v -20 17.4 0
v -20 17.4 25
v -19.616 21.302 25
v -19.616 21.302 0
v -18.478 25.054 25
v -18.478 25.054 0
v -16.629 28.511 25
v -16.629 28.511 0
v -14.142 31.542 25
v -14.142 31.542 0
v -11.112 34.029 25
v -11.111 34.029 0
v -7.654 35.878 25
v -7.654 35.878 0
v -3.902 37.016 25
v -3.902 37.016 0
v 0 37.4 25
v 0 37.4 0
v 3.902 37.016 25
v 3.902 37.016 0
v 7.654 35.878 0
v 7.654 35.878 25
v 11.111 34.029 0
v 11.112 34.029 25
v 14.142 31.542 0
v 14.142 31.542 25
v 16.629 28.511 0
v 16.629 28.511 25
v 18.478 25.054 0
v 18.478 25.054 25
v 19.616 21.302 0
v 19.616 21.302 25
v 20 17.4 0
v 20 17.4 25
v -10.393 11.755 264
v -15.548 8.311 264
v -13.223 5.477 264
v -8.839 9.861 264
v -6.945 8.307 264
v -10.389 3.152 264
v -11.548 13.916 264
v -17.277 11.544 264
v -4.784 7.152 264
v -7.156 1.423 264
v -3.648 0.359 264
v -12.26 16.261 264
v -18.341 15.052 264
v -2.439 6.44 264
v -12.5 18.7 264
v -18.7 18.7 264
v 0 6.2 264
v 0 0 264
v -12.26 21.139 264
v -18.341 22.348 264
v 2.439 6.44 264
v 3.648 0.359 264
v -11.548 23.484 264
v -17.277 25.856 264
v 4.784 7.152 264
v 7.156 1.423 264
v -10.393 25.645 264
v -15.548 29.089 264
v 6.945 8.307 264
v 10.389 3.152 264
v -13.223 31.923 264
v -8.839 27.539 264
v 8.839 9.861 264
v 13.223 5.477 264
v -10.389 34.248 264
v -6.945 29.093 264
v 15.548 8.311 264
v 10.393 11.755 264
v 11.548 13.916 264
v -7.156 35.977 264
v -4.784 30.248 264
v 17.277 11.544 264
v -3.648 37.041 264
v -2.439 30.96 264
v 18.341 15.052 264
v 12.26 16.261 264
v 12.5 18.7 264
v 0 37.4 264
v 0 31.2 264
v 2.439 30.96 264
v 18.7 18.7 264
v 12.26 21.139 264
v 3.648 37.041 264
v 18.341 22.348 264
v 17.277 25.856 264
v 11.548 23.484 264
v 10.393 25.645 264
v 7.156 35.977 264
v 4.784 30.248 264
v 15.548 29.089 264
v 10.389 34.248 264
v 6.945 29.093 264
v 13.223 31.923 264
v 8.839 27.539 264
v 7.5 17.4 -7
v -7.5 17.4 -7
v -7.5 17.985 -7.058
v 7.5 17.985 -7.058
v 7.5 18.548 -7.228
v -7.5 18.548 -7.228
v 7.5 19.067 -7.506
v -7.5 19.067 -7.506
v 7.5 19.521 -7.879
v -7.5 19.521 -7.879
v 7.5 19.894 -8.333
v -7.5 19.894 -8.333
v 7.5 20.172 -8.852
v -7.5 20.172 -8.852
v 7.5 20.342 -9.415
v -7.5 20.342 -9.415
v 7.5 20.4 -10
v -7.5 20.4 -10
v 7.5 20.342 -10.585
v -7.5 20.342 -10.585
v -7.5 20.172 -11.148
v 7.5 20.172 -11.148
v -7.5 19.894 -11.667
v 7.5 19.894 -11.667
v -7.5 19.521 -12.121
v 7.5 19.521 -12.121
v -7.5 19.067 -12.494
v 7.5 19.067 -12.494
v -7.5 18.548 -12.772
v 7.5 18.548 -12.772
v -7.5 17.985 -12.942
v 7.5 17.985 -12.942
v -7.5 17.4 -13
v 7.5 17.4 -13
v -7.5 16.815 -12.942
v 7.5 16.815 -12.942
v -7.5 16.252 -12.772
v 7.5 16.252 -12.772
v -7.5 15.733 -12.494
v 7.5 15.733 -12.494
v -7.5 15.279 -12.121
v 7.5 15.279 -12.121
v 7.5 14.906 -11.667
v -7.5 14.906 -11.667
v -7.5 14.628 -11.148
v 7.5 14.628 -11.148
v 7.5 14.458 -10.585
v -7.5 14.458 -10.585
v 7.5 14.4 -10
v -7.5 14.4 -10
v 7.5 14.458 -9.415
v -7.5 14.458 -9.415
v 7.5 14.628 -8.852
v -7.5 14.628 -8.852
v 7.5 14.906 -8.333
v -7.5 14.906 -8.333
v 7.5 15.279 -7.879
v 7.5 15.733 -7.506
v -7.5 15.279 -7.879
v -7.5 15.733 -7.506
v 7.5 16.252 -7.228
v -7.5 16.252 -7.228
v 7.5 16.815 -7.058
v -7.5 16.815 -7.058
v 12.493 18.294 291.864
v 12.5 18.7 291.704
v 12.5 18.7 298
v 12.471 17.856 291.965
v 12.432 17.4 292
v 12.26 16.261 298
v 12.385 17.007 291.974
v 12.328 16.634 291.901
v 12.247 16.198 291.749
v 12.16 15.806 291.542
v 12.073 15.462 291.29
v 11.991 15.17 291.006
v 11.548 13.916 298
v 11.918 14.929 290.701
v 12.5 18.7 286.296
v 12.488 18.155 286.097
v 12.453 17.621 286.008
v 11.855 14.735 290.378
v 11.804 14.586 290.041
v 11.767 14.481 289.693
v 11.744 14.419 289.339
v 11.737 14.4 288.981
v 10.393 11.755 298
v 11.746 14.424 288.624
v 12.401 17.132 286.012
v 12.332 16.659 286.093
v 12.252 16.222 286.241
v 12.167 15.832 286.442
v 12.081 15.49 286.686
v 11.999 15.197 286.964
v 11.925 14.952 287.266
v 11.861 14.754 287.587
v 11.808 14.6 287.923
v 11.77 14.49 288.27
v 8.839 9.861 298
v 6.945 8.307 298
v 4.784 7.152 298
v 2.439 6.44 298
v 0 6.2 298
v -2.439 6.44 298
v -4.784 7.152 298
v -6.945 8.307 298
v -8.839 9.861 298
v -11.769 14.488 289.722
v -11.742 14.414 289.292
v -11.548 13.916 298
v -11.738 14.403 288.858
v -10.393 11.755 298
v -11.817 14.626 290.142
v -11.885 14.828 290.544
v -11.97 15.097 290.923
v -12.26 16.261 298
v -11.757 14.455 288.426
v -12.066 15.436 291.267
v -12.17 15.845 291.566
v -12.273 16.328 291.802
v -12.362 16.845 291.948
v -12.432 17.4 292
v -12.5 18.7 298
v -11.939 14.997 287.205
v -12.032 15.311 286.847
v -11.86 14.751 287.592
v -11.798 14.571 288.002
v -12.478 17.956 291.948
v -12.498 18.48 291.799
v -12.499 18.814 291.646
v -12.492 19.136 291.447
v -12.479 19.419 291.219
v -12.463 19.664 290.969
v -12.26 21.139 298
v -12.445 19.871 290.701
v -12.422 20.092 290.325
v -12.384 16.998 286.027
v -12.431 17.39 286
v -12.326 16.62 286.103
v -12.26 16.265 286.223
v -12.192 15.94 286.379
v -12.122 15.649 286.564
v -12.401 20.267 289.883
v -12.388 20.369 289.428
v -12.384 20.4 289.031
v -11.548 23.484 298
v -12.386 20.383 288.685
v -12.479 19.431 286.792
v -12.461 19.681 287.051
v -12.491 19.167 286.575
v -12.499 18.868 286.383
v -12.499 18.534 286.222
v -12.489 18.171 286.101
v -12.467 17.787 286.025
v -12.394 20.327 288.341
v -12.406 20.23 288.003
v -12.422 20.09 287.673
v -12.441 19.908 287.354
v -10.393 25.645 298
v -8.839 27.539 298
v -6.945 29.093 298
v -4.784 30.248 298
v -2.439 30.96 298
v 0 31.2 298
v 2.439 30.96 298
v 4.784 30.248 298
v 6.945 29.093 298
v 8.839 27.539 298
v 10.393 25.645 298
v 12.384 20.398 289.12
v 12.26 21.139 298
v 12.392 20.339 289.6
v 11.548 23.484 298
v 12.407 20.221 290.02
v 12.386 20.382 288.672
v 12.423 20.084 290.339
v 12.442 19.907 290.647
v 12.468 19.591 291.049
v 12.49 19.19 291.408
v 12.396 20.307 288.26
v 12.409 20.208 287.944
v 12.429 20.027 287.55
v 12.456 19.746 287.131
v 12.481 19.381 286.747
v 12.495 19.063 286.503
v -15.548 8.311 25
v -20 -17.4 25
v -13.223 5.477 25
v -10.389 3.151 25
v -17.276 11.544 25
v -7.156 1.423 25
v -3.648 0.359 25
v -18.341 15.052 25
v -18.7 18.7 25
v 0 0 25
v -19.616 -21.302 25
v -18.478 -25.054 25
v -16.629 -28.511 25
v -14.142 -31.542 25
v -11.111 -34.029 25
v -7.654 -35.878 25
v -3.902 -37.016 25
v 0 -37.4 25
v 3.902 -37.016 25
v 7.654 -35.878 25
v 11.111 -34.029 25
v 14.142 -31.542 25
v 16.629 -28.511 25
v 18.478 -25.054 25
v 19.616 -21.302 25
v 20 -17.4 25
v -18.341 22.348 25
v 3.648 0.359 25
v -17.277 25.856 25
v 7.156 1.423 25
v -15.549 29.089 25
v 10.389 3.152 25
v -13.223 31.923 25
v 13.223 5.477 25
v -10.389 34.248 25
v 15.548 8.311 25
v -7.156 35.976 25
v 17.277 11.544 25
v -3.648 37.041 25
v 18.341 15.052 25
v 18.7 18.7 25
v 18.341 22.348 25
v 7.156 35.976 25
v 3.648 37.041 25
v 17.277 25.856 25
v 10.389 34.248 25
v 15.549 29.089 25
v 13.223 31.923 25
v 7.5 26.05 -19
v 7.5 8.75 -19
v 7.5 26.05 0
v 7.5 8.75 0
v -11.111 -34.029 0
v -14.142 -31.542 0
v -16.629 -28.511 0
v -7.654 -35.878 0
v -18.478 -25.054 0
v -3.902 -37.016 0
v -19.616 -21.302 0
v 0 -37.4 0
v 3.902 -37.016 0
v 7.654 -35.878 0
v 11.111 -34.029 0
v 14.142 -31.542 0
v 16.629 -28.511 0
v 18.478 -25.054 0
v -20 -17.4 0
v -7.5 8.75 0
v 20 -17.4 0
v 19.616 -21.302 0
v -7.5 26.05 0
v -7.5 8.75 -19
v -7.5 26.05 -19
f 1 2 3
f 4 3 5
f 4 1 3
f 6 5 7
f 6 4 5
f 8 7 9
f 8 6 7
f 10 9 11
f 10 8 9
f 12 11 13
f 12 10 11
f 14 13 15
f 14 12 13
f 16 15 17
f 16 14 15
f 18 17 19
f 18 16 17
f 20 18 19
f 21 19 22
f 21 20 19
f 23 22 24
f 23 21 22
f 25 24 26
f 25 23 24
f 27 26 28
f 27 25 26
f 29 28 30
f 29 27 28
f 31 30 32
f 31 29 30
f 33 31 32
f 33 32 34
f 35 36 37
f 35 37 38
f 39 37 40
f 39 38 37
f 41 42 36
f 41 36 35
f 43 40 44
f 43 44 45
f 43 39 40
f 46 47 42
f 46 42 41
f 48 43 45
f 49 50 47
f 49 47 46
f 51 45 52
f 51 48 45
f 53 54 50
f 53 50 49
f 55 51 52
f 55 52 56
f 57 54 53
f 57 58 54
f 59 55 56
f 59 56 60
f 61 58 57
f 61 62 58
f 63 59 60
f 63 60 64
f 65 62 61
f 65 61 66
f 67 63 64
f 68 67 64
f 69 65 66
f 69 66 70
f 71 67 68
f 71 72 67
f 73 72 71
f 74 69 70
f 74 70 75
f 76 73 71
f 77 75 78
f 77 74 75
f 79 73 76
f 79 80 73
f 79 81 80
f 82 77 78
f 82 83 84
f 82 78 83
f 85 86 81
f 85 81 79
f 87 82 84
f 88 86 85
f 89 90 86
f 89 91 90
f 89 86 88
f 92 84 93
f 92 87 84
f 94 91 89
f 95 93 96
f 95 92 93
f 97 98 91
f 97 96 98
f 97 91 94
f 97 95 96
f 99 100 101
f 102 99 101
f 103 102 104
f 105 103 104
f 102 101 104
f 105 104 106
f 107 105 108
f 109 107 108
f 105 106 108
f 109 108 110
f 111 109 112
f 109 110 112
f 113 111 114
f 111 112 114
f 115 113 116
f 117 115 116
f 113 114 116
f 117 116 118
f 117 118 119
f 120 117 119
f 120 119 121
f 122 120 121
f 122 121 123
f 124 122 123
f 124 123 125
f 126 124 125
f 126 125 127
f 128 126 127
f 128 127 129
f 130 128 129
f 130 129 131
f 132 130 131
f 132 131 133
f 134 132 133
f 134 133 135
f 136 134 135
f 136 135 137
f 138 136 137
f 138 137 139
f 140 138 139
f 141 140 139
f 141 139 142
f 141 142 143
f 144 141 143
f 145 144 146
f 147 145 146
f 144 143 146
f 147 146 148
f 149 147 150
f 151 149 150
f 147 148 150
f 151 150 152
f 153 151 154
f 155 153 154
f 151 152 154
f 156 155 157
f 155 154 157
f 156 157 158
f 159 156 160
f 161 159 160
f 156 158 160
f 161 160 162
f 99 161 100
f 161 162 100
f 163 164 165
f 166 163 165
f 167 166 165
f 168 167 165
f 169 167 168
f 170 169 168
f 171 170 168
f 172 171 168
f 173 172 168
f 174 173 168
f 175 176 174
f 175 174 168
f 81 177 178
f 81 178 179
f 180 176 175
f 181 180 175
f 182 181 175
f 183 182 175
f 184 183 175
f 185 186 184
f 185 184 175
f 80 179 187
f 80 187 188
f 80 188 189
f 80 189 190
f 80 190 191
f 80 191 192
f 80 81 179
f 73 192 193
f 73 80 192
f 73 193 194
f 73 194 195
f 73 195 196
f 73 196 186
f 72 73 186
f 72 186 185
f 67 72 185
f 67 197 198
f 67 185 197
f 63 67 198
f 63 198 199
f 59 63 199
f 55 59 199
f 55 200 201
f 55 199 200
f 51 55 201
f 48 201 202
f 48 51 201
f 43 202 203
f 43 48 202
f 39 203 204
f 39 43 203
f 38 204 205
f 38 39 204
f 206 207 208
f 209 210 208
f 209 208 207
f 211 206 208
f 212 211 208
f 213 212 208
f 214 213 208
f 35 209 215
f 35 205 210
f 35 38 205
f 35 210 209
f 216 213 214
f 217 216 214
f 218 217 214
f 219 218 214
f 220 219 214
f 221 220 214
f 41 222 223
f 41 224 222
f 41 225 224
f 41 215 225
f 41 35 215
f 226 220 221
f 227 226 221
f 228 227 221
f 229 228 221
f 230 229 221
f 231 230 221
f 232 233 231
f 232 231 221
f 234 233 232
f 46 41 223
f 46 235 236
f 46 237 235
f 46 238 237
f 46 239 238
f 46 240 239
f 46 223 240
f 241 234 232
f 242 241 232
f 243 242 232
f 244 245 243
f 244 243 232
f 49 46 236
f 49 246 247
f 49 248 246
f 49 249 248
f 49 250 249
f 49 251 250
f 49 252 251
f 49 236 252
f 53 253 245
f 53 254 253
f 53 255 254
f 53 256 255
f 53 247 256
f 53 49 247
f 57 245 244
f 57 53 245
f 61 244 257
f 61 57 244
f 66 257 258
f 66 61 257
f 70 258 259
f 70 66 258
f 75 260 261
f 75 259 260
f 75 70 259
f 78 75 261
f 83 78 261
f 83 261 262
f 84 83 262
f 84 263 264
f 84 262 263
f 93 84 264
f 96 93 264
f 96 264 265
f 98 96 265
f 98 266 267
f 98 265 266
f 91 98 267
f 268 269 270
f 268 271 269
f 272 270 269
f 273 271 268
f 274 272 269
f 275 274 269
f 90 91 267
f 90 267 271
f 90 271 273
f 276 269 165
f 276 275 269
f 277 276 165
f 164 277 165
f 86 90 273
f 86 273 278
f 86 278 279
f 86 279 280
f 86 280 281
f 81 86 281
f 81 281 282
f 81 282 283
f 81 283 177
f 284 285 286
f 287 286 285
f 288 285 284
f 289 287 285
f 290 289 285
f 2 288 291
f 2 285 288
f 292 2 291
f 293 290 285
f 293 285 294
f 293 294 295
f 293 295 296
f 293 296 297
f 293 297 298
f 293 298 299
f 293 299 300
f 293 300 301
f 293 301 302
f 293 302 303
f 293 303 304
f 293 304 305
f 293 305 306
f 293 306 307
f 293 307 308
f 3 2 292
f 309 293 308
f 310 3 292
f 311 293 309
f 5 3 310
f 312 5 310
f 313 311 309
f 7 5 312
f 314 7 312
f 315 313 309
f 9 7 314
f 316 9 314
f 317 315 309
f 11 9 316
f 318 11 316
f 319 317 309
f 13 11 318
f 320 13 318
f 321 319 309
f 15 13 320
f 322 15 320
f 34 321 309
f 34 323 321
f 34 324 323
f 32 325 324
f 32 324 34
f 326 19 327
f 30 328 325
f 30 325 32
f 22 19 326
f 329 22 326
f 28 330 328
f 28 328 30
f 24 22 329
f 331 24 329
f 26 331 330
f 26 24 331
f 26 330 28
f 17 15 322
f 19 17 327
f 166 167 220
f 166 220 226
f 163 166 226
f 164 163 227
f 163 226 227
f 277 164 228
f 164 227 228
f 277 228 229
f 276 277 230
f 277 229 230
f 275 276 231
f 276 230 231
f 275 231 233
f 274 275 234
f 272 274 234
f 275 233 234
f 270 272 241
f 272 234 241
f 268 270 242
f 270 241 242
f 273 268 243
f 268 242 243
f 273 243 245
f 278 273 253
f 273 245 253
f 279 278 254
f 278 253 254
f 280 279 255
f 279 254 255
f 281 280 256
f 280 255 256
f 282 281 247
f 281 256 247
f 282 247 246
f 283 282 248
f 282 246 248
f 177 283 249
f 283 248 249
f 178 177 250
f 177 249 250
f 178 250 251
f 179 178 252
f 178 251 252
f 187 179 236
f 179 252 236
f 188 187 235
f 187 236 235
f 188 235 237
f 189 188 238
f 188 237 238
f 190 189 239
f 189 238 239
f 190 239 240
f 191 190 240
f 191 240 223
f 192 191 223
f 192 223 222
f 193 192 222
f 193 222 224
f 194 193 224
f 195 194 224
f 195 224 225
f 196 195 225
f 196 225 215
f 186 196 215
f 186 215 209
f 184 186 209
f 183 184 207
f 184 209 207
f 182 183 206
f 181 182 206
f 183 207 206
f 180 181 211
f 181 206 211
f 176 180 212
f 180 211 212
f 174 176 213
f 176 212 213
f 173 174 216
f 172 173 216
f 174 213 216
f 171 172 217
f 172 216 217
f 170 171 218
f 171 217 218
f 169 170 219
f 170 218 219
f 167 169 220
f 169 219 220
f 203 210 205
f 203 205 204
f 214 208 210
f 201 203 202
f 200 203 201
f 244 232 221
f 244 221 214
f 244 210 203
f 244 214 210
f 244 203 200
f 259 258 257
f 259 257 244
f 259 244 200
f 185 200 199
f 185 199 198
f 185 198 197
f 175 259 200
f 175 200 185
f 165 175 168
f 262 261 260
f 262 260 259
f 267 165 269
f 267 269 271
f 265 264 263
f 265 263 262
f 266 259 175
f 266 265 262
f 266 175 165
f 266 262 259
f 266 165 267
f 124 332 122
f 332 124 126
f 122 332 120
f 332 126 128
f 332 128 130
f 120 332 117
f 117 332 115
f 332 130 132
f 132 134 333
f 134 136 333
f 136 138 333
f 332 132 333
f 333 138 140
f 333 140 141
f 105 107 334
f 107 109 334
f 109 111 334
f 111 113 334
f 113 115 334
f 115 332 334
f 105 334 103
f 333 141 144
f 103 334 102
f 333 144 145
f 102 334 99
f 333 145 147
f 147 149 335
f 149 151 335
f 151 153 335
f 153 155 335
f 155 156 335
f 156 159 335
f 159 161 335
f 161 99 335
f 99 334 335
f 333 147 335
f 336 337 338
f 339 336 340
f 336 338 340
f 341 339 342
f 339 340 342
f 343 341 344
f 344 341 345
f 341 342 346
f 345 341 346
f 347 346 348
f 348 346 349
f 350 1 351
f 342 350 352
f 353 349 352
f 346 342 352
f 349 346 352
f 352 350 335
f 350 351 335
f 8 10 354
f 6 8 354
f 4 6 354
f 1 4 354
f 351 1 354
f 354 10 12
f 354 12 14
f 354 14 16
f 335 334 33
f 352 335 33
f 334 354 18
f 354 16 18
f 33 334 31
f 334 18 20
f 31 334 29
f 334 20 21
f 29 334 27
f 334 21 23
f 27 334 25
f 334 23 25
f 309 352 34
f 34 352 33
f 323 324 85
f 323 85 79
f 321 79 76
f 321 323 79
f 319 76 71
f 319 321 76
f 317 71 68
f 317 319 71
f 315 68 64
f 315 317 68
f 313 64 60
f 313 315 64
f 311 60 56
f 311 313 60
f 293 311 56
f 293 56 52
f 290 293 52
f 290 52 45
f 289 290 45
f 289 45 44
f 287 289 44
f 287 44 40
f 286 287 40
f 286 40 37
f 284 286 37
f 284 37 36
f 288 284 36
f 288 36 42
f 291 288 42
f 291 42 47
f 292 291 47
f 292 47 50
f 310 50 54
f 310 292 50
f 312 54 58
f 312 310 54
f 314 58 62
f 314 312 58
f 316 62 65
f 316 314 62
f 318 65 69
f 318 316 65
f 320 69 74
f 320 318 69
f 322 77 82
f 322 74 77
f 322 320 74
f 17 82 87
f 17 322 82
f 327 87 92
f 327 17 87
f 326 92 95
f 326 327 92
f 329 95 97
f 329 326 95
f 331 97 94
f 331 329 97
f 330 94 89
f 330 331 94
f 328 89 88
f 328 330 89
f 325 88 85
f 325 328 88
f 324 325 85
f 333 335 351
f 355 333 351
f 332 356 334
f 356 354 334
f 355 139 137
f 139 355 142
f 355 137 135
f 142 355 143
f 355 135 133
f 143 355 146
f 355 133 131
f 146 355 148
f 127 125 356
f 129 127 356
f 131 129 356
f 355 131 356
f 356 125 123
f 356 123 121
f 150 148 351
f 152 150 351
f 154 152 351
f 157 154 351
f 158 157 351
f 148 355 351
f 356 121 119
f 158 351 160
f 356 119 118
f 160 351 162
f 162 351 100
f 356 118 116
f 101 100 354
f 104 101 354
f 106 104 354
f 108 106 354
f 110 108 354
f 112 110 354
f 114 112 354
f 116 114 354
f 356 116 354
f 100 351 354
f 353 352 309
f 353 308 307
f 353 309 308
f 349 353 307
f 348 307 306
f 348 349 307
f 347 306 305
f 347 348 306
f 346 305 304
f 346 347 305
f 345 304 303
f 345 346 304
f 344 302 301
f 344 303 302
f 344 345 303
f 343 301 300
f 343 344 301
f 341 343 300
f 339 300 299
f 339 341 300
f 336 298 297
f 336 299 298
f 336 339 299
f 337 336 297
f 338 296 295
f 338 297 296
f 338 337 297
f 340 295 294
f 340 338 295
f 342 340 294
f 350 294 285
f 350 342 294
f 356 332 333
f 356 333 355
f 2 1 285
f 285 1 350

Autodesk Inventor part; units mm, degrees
ref_plane "YZ Plane" through (0, 0, 0) normal (1, 0, 0) x (0, 1, 0)
ref_plane "XZ Plane" through (0, 0, 0) normal (0, 1, 0) x (-1, 0, 0)
ref_plane "XY Plane" through (0, 0, 0) normal (0, 0, 1) x (1, 0, 0)
sketch "스케치1" plane through (0, 0, 0) normal (0, 0, 1) x (1, 0, 0)
  line L0 (0, 17.4) -> (0, -17.4) construction
  line L1 (-20, 17.4) -> (-20, -17.4)
  line L2 (20, -17.4) -> (20, 17.4)
  arc A0 (20, 17.4) -> (-20, 17.4) centre (0, 17.4) ccw
  arc A1 (-20, -17.4) -> (20, -17.4) centre (0, -17.4) ccw
  point P0 (0, 0)
  point P1 (0, 0)
  dimension "d0" = 34.8
  dimension "d1" = 40
extrude "돌출1" add sketch "스케치1" along normal blind 25
sketch "스케치2" plane through (0, 0, 25) normal (0, 0, 1) x (1, 0, 0)
  circle A0 centre (0, 18.7) radius 18.7
  point P0 (0, 0)
  dimension "d4" = 37.4
extrude "돌출2" add sketch "스케치2" along normal blind 239
sketch "스케치3" plane through (0, 18.7, 264) normal (0, 0, 1) x (1, 0, 0)
  circle A0 centre (0, 0) radius 12.5
  point P0 (0, -18.7)
  dimension "d7" = 25
extrude "돌출3" add sketch "스케치3" along normal blind 34
sketch "스케치5" plane through (0, 0, 0) normal (0, 0, -1) x (-1, 0, 0)
  line L0 (-7.5, 8.75) -> (7.5, 8.75)
  line L1 (7.5, 8.75) -> (7.5, 26.05)
  line L2 (7.5, 26.05) -> (-7.5, 26.05)
  line L3 (-7.5, 26.05) -> (-7.5, 8.75)
  arc A0 (20, 17.4) -> (-20, 17.4) centre (0, 17.4) ccw projected
  point P0 (0, 0)
  dimension "d10" = 15
  dimension "d11" = 17.3
  dimension "d12" = 8.65
  dimension "d13" = 7.5
extrude "돌출4" add sketch "스케치5" along normal blind 19
sketch "스케치6" plane through (-20, -17.4, 0) normal (-1, 0, 0) x (0, 0, 1)
  circle A0 centre (-10, 34.8) radius 3
  line L0 (-19, 26.15) -> (-19, 43.45) projected
  line L1 (0, 43.45) -> (-19, 43.45) projected
  circle A1 centre (289, 34.8) radius 3
  line L2 (0, 0) -> (25, 0) projected
  point P0 (0, 17.4)
  dimension "d16" = 6
  dimension "d17" = 9
  dimension "d18" = 8.65
  dimension "d19" = 299
  dimension "d20" = 34.8
  dimension "d21" = 6
extrude "돌출5" cut sketch "스케치6" against normal through all
properties part number "높이조절 액추에이터_최대" material "알루미늄 6061"
